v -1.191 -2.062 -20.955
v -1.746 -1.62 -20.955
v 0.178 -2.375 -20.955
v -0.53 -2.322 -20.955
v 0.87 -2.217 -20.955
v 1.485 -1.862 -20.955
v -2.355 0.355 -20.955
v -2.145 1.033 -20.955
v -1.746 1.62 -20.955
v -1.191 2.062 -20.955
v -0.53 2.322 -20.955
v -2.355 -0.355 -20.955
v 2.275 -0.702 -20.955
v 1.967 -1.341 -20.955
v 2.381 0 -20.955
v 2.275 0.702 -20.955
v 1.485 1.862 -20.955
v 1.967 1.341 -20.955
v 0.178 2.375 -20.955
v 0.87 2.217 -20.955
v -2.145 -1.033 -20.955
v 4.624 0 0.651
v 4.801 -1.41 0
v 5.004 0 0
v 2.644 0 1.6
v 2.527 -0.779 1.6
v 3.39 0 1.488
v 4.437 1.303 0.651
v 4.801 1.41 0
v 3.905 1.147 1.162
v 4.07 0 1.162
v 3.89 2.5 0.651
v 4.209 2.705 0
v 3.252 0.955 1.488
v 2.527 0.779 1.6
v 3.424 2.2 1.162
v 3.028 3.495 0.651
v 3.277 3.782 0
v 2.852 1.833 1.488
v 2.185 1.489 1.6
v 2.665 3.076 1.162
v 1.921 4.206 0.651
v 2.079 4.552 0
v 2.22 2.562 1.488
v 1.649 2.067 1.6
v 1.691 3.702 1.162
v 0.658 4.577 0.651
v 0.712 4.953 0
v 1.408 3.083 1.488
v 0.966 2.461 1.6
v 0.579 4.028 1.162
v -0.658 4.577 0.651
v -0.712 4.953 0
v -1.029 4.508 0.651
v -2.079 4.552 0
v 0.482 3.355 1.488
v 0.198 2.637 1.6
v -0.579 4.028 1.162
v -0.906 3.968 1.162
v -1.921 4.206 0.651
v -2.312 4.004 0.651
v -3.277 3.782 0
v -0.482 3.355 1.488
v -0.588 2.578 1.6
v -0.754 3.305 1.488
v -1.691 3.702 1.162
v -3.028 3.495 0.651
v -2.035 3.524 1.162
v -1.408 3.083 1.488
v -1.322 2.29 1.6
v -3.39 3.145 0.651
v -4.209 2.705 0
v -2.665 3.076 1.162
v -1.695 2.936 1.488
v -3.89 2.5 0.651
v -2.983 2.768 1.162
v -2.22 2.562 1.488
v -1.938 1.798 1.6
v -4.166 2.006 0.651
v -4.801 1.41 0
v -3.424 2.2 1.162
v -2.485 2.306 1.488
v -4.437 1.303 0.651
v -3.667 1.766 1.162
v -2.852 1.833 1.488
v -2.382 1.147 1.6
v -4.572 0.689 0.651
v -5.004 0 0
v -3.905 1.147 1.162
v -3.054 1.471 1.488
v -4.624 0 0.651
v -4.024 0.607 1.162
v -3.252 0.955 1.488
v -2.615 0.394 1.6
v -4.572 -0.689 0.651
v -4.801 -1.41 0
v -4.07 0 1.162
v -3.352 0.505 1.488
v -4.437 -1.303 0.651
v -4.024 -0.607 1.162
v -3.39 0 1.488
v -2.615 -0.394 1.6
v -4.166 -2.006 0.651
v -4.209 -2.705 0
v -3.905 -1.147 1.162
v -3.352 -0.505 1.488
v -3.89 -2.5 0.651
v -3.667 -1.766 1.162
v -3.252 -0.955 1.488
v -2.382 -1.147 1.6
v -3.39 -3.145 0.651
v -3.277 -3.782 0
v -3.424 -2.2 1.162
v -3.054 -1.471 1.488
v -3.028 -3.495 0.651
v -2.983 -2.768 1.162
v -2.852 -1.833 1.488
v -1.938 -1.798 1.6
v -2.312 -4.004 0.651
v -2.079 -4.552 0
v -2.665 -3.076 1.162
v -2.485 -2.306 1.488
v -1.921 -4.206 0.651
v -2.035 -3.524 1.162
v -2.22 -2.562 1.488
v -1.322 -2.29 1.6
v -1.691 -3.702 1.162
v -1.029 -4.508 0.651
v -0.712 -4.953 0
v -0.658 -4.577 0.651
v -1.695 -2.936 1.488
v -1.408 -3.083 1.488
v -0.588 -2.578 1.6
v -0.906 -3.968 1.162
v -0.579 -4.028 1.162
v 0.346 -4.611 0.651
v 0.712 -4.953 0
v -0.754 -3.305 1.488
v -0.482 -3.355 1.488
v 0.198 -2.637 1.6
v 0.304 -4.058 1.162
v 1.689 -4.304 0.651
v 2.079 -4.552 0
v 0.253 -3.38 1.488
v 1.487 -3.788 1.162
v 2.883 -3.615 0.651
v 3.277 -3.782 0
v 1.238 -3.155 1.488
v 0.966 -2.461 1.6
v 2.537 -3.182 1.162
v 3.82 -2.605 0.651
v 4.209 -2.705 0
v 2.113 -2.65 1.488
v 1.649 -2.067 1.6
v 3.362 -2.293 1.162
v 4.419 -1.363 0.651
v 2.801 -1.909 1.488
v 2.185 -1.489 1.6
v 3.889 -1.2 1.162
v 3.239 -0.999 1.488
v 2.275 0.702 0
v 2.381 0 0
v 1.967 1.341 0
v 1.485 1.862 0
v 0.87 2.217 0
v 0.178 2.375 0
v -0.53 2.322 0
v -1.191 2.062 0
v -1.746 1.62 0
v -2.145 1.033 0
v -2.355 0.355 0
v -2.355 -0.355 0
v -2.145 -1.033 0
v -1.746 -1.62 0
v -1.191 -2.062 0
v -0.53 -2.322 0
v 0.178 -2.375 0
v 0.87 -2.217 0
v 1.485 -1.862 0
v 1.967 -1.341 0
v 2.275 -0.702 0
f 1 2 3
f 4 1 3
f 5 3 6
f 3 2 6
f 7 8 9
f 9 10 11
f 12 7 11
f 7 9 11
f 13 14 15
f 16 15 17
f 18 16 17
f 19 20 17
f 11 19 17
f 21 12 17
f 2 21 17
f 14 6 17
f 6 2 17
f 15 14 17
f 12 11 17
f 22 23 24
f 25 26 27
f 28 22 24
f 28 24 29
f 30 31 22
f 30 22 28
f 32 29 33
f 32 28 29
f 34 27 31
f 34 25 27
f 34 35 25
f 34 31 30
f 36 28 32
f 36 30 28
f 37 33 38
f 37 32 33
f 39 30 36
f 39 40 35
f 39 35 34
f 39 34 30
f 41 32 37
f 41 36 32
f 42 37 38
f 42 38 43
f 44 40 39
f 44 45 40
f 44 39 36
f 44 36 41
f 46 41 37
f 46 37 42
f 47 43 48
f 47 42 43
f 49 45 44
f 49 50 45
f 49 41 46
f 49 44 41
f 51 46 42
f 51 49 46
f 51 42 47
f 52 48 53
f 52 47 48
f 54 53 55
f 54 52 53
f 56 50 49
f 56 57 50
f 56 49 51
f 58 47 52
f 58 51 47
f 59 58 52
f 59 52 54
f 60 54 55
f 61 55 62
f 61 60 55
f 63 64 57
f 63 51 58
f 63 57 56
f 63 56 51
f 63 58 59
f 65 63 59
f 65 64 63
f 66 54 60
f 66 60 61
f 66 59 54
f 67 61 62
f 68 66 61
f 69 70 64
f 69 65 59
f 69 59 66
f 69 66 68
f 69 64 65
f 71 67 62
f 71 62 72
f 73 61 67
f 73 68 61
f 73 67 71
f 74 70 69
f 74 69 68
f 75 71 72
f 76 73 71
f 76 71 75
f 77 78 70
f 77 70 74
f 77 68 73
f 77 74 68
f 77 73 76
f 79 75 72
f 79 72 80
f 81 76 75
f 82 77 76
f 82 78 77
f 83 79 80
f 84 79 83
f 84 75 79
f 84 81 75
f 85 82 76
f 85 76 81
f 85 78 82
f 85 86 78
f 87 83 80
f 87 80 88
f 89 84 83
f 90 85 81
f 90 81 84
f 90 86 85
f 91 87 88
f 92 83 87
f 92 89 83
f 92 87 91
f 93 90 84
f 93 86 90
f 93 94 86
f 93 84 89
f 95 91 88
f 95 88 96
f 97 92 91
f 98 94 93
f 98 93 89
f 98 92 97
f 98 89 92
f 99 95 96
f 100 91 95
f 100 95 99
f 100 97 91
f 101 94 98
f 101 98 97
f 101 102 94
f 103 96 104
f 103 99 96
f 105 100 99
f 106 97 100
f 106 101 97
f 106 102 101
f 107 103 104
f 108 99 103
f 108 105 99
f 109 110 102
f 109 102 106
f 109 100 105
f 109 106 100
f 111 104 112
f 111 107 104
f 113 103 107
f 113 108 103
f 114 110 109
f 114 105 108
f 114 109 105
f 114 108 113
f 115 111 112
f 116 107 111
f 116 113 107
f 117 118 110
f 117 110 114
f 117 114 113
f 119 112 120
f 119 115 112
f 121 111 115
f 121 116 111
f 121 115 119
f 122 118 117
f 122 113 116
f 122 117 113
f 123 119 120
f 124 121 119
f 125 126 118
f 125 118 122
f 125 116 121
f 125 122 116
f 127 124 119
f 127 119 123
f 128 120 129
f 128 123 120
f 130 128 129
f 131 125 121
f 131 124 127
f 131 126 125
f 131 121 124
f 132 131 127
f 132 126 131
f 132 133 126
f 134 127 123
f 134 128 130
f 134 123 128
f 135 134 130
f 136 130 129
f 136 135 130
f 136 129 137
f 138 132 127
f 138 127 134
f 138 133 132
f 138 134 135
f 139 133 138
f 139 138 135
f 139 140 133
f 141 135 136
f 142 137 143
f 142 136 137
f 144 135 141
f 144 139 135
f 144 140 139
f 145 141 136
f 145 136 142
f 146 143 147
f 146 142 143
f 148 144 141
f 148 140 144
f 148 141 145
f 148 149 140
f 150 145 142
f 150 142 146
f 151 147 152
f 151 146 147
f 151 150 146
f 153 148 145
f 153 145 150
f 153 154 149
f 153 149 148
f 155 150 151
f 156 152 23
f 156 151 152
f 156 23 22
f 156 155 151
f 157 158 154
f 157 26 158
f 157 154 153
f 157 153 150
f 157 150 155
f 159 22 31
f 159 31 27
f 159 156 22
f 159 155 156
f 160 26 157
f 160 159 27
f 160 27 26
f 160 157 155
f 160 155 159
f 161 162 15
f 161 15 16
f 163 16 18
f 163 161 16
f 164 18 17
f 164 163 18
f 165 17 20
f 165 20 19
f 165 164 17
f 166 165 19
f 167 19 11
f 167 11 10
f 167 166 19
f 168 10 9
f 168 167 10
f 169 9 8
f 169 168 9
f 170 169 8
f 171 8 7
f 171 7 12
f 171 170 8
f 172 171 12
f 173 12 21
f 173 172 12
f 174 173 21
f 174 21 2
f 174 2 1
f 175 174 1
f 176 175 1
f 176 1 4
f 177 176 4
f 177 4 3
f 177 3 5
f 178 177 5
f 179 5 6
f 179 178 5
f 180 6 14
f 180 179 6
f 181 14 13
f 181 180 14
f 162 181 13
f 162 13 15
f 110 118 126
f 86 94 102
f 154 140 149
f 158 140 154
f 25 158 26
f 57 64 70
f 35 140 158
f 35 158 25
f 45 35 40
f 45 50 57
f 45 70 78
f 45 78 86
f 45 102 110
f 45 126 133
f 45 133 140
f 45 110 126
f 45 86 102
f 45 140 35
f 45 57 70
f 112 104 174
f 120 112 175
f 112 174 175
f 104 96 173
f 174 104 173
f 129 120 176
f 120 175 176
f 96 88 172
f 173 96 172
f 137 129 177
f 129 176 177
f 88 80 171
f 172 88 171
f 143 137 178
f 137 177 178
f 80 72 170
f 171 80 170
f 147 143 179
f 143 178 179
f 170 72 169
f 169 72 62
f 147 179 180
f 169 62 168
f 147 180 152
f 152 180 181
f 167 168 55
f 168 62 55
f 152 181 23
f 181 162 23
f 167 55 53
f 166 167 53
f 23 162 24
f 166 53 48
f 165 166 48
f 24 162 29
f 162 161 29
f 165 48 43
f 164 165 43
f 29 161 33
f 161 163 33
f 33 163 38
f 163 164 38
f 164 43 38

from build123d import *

# Parameters (mm, degrees)
SKETCH1_R           = 5.0038
BOSS_EXTRUDE1_DEPTH = 1.6002
SKETCH2_R           = 2.38125
BOSS_EXTRUDE2_DEPTH = 20.955
FILLET1_R           = 2.54


with BuildPart() as part:
    # Sketch1 → Boss-Extrude1 (new body)
    with BuildSketch(Plane.XY):
        Circle(SKETCH1_R)
    extrude(amount=BOSS_EXTRUDE1_DEPTH)

    # Sketch2 → Boss-Extrude2 (add)
    with BuildSketch(Plane.XY):
        Circle(SKETCH2_R)
    extrude(amount=-BOSS_EXTRUDE2_DEPTH)

    # Fillet1
    # the kernel refuses this fillet: 2.54 mm, written as the material it takes off along each edge
    with BuildSketch(Plane(origin=(0, 0, 1.6002), x_dir=(1, 0, 0), z_dir=(0, -1, 0))) as fillet1_piece_1:
        with BuildLine():
            CenterArc((2.644059345, -2.54), FILLET1_R, 21.715617283, 68.284382717)
            Line((2.644059345, 0), (2.644059345, 0.0508))
            Line((2.644059345, 0.0508), (5.0038, 0.0508))
            Line((5.0038, 0.0508), (5.0546, 0))
            ThreePointArc((5.0546, 0), (5.0546, -0.8001), (5.050994813, -1.581404))
            Line((5.050994813, -1.581404), (5.0038, -1.6002))
        make_face()
    revolve(axis=Axis((0, 0, 1.6002), (0, 0, 1)), mode=Mode.SUBTRACT)


solid = part.part
